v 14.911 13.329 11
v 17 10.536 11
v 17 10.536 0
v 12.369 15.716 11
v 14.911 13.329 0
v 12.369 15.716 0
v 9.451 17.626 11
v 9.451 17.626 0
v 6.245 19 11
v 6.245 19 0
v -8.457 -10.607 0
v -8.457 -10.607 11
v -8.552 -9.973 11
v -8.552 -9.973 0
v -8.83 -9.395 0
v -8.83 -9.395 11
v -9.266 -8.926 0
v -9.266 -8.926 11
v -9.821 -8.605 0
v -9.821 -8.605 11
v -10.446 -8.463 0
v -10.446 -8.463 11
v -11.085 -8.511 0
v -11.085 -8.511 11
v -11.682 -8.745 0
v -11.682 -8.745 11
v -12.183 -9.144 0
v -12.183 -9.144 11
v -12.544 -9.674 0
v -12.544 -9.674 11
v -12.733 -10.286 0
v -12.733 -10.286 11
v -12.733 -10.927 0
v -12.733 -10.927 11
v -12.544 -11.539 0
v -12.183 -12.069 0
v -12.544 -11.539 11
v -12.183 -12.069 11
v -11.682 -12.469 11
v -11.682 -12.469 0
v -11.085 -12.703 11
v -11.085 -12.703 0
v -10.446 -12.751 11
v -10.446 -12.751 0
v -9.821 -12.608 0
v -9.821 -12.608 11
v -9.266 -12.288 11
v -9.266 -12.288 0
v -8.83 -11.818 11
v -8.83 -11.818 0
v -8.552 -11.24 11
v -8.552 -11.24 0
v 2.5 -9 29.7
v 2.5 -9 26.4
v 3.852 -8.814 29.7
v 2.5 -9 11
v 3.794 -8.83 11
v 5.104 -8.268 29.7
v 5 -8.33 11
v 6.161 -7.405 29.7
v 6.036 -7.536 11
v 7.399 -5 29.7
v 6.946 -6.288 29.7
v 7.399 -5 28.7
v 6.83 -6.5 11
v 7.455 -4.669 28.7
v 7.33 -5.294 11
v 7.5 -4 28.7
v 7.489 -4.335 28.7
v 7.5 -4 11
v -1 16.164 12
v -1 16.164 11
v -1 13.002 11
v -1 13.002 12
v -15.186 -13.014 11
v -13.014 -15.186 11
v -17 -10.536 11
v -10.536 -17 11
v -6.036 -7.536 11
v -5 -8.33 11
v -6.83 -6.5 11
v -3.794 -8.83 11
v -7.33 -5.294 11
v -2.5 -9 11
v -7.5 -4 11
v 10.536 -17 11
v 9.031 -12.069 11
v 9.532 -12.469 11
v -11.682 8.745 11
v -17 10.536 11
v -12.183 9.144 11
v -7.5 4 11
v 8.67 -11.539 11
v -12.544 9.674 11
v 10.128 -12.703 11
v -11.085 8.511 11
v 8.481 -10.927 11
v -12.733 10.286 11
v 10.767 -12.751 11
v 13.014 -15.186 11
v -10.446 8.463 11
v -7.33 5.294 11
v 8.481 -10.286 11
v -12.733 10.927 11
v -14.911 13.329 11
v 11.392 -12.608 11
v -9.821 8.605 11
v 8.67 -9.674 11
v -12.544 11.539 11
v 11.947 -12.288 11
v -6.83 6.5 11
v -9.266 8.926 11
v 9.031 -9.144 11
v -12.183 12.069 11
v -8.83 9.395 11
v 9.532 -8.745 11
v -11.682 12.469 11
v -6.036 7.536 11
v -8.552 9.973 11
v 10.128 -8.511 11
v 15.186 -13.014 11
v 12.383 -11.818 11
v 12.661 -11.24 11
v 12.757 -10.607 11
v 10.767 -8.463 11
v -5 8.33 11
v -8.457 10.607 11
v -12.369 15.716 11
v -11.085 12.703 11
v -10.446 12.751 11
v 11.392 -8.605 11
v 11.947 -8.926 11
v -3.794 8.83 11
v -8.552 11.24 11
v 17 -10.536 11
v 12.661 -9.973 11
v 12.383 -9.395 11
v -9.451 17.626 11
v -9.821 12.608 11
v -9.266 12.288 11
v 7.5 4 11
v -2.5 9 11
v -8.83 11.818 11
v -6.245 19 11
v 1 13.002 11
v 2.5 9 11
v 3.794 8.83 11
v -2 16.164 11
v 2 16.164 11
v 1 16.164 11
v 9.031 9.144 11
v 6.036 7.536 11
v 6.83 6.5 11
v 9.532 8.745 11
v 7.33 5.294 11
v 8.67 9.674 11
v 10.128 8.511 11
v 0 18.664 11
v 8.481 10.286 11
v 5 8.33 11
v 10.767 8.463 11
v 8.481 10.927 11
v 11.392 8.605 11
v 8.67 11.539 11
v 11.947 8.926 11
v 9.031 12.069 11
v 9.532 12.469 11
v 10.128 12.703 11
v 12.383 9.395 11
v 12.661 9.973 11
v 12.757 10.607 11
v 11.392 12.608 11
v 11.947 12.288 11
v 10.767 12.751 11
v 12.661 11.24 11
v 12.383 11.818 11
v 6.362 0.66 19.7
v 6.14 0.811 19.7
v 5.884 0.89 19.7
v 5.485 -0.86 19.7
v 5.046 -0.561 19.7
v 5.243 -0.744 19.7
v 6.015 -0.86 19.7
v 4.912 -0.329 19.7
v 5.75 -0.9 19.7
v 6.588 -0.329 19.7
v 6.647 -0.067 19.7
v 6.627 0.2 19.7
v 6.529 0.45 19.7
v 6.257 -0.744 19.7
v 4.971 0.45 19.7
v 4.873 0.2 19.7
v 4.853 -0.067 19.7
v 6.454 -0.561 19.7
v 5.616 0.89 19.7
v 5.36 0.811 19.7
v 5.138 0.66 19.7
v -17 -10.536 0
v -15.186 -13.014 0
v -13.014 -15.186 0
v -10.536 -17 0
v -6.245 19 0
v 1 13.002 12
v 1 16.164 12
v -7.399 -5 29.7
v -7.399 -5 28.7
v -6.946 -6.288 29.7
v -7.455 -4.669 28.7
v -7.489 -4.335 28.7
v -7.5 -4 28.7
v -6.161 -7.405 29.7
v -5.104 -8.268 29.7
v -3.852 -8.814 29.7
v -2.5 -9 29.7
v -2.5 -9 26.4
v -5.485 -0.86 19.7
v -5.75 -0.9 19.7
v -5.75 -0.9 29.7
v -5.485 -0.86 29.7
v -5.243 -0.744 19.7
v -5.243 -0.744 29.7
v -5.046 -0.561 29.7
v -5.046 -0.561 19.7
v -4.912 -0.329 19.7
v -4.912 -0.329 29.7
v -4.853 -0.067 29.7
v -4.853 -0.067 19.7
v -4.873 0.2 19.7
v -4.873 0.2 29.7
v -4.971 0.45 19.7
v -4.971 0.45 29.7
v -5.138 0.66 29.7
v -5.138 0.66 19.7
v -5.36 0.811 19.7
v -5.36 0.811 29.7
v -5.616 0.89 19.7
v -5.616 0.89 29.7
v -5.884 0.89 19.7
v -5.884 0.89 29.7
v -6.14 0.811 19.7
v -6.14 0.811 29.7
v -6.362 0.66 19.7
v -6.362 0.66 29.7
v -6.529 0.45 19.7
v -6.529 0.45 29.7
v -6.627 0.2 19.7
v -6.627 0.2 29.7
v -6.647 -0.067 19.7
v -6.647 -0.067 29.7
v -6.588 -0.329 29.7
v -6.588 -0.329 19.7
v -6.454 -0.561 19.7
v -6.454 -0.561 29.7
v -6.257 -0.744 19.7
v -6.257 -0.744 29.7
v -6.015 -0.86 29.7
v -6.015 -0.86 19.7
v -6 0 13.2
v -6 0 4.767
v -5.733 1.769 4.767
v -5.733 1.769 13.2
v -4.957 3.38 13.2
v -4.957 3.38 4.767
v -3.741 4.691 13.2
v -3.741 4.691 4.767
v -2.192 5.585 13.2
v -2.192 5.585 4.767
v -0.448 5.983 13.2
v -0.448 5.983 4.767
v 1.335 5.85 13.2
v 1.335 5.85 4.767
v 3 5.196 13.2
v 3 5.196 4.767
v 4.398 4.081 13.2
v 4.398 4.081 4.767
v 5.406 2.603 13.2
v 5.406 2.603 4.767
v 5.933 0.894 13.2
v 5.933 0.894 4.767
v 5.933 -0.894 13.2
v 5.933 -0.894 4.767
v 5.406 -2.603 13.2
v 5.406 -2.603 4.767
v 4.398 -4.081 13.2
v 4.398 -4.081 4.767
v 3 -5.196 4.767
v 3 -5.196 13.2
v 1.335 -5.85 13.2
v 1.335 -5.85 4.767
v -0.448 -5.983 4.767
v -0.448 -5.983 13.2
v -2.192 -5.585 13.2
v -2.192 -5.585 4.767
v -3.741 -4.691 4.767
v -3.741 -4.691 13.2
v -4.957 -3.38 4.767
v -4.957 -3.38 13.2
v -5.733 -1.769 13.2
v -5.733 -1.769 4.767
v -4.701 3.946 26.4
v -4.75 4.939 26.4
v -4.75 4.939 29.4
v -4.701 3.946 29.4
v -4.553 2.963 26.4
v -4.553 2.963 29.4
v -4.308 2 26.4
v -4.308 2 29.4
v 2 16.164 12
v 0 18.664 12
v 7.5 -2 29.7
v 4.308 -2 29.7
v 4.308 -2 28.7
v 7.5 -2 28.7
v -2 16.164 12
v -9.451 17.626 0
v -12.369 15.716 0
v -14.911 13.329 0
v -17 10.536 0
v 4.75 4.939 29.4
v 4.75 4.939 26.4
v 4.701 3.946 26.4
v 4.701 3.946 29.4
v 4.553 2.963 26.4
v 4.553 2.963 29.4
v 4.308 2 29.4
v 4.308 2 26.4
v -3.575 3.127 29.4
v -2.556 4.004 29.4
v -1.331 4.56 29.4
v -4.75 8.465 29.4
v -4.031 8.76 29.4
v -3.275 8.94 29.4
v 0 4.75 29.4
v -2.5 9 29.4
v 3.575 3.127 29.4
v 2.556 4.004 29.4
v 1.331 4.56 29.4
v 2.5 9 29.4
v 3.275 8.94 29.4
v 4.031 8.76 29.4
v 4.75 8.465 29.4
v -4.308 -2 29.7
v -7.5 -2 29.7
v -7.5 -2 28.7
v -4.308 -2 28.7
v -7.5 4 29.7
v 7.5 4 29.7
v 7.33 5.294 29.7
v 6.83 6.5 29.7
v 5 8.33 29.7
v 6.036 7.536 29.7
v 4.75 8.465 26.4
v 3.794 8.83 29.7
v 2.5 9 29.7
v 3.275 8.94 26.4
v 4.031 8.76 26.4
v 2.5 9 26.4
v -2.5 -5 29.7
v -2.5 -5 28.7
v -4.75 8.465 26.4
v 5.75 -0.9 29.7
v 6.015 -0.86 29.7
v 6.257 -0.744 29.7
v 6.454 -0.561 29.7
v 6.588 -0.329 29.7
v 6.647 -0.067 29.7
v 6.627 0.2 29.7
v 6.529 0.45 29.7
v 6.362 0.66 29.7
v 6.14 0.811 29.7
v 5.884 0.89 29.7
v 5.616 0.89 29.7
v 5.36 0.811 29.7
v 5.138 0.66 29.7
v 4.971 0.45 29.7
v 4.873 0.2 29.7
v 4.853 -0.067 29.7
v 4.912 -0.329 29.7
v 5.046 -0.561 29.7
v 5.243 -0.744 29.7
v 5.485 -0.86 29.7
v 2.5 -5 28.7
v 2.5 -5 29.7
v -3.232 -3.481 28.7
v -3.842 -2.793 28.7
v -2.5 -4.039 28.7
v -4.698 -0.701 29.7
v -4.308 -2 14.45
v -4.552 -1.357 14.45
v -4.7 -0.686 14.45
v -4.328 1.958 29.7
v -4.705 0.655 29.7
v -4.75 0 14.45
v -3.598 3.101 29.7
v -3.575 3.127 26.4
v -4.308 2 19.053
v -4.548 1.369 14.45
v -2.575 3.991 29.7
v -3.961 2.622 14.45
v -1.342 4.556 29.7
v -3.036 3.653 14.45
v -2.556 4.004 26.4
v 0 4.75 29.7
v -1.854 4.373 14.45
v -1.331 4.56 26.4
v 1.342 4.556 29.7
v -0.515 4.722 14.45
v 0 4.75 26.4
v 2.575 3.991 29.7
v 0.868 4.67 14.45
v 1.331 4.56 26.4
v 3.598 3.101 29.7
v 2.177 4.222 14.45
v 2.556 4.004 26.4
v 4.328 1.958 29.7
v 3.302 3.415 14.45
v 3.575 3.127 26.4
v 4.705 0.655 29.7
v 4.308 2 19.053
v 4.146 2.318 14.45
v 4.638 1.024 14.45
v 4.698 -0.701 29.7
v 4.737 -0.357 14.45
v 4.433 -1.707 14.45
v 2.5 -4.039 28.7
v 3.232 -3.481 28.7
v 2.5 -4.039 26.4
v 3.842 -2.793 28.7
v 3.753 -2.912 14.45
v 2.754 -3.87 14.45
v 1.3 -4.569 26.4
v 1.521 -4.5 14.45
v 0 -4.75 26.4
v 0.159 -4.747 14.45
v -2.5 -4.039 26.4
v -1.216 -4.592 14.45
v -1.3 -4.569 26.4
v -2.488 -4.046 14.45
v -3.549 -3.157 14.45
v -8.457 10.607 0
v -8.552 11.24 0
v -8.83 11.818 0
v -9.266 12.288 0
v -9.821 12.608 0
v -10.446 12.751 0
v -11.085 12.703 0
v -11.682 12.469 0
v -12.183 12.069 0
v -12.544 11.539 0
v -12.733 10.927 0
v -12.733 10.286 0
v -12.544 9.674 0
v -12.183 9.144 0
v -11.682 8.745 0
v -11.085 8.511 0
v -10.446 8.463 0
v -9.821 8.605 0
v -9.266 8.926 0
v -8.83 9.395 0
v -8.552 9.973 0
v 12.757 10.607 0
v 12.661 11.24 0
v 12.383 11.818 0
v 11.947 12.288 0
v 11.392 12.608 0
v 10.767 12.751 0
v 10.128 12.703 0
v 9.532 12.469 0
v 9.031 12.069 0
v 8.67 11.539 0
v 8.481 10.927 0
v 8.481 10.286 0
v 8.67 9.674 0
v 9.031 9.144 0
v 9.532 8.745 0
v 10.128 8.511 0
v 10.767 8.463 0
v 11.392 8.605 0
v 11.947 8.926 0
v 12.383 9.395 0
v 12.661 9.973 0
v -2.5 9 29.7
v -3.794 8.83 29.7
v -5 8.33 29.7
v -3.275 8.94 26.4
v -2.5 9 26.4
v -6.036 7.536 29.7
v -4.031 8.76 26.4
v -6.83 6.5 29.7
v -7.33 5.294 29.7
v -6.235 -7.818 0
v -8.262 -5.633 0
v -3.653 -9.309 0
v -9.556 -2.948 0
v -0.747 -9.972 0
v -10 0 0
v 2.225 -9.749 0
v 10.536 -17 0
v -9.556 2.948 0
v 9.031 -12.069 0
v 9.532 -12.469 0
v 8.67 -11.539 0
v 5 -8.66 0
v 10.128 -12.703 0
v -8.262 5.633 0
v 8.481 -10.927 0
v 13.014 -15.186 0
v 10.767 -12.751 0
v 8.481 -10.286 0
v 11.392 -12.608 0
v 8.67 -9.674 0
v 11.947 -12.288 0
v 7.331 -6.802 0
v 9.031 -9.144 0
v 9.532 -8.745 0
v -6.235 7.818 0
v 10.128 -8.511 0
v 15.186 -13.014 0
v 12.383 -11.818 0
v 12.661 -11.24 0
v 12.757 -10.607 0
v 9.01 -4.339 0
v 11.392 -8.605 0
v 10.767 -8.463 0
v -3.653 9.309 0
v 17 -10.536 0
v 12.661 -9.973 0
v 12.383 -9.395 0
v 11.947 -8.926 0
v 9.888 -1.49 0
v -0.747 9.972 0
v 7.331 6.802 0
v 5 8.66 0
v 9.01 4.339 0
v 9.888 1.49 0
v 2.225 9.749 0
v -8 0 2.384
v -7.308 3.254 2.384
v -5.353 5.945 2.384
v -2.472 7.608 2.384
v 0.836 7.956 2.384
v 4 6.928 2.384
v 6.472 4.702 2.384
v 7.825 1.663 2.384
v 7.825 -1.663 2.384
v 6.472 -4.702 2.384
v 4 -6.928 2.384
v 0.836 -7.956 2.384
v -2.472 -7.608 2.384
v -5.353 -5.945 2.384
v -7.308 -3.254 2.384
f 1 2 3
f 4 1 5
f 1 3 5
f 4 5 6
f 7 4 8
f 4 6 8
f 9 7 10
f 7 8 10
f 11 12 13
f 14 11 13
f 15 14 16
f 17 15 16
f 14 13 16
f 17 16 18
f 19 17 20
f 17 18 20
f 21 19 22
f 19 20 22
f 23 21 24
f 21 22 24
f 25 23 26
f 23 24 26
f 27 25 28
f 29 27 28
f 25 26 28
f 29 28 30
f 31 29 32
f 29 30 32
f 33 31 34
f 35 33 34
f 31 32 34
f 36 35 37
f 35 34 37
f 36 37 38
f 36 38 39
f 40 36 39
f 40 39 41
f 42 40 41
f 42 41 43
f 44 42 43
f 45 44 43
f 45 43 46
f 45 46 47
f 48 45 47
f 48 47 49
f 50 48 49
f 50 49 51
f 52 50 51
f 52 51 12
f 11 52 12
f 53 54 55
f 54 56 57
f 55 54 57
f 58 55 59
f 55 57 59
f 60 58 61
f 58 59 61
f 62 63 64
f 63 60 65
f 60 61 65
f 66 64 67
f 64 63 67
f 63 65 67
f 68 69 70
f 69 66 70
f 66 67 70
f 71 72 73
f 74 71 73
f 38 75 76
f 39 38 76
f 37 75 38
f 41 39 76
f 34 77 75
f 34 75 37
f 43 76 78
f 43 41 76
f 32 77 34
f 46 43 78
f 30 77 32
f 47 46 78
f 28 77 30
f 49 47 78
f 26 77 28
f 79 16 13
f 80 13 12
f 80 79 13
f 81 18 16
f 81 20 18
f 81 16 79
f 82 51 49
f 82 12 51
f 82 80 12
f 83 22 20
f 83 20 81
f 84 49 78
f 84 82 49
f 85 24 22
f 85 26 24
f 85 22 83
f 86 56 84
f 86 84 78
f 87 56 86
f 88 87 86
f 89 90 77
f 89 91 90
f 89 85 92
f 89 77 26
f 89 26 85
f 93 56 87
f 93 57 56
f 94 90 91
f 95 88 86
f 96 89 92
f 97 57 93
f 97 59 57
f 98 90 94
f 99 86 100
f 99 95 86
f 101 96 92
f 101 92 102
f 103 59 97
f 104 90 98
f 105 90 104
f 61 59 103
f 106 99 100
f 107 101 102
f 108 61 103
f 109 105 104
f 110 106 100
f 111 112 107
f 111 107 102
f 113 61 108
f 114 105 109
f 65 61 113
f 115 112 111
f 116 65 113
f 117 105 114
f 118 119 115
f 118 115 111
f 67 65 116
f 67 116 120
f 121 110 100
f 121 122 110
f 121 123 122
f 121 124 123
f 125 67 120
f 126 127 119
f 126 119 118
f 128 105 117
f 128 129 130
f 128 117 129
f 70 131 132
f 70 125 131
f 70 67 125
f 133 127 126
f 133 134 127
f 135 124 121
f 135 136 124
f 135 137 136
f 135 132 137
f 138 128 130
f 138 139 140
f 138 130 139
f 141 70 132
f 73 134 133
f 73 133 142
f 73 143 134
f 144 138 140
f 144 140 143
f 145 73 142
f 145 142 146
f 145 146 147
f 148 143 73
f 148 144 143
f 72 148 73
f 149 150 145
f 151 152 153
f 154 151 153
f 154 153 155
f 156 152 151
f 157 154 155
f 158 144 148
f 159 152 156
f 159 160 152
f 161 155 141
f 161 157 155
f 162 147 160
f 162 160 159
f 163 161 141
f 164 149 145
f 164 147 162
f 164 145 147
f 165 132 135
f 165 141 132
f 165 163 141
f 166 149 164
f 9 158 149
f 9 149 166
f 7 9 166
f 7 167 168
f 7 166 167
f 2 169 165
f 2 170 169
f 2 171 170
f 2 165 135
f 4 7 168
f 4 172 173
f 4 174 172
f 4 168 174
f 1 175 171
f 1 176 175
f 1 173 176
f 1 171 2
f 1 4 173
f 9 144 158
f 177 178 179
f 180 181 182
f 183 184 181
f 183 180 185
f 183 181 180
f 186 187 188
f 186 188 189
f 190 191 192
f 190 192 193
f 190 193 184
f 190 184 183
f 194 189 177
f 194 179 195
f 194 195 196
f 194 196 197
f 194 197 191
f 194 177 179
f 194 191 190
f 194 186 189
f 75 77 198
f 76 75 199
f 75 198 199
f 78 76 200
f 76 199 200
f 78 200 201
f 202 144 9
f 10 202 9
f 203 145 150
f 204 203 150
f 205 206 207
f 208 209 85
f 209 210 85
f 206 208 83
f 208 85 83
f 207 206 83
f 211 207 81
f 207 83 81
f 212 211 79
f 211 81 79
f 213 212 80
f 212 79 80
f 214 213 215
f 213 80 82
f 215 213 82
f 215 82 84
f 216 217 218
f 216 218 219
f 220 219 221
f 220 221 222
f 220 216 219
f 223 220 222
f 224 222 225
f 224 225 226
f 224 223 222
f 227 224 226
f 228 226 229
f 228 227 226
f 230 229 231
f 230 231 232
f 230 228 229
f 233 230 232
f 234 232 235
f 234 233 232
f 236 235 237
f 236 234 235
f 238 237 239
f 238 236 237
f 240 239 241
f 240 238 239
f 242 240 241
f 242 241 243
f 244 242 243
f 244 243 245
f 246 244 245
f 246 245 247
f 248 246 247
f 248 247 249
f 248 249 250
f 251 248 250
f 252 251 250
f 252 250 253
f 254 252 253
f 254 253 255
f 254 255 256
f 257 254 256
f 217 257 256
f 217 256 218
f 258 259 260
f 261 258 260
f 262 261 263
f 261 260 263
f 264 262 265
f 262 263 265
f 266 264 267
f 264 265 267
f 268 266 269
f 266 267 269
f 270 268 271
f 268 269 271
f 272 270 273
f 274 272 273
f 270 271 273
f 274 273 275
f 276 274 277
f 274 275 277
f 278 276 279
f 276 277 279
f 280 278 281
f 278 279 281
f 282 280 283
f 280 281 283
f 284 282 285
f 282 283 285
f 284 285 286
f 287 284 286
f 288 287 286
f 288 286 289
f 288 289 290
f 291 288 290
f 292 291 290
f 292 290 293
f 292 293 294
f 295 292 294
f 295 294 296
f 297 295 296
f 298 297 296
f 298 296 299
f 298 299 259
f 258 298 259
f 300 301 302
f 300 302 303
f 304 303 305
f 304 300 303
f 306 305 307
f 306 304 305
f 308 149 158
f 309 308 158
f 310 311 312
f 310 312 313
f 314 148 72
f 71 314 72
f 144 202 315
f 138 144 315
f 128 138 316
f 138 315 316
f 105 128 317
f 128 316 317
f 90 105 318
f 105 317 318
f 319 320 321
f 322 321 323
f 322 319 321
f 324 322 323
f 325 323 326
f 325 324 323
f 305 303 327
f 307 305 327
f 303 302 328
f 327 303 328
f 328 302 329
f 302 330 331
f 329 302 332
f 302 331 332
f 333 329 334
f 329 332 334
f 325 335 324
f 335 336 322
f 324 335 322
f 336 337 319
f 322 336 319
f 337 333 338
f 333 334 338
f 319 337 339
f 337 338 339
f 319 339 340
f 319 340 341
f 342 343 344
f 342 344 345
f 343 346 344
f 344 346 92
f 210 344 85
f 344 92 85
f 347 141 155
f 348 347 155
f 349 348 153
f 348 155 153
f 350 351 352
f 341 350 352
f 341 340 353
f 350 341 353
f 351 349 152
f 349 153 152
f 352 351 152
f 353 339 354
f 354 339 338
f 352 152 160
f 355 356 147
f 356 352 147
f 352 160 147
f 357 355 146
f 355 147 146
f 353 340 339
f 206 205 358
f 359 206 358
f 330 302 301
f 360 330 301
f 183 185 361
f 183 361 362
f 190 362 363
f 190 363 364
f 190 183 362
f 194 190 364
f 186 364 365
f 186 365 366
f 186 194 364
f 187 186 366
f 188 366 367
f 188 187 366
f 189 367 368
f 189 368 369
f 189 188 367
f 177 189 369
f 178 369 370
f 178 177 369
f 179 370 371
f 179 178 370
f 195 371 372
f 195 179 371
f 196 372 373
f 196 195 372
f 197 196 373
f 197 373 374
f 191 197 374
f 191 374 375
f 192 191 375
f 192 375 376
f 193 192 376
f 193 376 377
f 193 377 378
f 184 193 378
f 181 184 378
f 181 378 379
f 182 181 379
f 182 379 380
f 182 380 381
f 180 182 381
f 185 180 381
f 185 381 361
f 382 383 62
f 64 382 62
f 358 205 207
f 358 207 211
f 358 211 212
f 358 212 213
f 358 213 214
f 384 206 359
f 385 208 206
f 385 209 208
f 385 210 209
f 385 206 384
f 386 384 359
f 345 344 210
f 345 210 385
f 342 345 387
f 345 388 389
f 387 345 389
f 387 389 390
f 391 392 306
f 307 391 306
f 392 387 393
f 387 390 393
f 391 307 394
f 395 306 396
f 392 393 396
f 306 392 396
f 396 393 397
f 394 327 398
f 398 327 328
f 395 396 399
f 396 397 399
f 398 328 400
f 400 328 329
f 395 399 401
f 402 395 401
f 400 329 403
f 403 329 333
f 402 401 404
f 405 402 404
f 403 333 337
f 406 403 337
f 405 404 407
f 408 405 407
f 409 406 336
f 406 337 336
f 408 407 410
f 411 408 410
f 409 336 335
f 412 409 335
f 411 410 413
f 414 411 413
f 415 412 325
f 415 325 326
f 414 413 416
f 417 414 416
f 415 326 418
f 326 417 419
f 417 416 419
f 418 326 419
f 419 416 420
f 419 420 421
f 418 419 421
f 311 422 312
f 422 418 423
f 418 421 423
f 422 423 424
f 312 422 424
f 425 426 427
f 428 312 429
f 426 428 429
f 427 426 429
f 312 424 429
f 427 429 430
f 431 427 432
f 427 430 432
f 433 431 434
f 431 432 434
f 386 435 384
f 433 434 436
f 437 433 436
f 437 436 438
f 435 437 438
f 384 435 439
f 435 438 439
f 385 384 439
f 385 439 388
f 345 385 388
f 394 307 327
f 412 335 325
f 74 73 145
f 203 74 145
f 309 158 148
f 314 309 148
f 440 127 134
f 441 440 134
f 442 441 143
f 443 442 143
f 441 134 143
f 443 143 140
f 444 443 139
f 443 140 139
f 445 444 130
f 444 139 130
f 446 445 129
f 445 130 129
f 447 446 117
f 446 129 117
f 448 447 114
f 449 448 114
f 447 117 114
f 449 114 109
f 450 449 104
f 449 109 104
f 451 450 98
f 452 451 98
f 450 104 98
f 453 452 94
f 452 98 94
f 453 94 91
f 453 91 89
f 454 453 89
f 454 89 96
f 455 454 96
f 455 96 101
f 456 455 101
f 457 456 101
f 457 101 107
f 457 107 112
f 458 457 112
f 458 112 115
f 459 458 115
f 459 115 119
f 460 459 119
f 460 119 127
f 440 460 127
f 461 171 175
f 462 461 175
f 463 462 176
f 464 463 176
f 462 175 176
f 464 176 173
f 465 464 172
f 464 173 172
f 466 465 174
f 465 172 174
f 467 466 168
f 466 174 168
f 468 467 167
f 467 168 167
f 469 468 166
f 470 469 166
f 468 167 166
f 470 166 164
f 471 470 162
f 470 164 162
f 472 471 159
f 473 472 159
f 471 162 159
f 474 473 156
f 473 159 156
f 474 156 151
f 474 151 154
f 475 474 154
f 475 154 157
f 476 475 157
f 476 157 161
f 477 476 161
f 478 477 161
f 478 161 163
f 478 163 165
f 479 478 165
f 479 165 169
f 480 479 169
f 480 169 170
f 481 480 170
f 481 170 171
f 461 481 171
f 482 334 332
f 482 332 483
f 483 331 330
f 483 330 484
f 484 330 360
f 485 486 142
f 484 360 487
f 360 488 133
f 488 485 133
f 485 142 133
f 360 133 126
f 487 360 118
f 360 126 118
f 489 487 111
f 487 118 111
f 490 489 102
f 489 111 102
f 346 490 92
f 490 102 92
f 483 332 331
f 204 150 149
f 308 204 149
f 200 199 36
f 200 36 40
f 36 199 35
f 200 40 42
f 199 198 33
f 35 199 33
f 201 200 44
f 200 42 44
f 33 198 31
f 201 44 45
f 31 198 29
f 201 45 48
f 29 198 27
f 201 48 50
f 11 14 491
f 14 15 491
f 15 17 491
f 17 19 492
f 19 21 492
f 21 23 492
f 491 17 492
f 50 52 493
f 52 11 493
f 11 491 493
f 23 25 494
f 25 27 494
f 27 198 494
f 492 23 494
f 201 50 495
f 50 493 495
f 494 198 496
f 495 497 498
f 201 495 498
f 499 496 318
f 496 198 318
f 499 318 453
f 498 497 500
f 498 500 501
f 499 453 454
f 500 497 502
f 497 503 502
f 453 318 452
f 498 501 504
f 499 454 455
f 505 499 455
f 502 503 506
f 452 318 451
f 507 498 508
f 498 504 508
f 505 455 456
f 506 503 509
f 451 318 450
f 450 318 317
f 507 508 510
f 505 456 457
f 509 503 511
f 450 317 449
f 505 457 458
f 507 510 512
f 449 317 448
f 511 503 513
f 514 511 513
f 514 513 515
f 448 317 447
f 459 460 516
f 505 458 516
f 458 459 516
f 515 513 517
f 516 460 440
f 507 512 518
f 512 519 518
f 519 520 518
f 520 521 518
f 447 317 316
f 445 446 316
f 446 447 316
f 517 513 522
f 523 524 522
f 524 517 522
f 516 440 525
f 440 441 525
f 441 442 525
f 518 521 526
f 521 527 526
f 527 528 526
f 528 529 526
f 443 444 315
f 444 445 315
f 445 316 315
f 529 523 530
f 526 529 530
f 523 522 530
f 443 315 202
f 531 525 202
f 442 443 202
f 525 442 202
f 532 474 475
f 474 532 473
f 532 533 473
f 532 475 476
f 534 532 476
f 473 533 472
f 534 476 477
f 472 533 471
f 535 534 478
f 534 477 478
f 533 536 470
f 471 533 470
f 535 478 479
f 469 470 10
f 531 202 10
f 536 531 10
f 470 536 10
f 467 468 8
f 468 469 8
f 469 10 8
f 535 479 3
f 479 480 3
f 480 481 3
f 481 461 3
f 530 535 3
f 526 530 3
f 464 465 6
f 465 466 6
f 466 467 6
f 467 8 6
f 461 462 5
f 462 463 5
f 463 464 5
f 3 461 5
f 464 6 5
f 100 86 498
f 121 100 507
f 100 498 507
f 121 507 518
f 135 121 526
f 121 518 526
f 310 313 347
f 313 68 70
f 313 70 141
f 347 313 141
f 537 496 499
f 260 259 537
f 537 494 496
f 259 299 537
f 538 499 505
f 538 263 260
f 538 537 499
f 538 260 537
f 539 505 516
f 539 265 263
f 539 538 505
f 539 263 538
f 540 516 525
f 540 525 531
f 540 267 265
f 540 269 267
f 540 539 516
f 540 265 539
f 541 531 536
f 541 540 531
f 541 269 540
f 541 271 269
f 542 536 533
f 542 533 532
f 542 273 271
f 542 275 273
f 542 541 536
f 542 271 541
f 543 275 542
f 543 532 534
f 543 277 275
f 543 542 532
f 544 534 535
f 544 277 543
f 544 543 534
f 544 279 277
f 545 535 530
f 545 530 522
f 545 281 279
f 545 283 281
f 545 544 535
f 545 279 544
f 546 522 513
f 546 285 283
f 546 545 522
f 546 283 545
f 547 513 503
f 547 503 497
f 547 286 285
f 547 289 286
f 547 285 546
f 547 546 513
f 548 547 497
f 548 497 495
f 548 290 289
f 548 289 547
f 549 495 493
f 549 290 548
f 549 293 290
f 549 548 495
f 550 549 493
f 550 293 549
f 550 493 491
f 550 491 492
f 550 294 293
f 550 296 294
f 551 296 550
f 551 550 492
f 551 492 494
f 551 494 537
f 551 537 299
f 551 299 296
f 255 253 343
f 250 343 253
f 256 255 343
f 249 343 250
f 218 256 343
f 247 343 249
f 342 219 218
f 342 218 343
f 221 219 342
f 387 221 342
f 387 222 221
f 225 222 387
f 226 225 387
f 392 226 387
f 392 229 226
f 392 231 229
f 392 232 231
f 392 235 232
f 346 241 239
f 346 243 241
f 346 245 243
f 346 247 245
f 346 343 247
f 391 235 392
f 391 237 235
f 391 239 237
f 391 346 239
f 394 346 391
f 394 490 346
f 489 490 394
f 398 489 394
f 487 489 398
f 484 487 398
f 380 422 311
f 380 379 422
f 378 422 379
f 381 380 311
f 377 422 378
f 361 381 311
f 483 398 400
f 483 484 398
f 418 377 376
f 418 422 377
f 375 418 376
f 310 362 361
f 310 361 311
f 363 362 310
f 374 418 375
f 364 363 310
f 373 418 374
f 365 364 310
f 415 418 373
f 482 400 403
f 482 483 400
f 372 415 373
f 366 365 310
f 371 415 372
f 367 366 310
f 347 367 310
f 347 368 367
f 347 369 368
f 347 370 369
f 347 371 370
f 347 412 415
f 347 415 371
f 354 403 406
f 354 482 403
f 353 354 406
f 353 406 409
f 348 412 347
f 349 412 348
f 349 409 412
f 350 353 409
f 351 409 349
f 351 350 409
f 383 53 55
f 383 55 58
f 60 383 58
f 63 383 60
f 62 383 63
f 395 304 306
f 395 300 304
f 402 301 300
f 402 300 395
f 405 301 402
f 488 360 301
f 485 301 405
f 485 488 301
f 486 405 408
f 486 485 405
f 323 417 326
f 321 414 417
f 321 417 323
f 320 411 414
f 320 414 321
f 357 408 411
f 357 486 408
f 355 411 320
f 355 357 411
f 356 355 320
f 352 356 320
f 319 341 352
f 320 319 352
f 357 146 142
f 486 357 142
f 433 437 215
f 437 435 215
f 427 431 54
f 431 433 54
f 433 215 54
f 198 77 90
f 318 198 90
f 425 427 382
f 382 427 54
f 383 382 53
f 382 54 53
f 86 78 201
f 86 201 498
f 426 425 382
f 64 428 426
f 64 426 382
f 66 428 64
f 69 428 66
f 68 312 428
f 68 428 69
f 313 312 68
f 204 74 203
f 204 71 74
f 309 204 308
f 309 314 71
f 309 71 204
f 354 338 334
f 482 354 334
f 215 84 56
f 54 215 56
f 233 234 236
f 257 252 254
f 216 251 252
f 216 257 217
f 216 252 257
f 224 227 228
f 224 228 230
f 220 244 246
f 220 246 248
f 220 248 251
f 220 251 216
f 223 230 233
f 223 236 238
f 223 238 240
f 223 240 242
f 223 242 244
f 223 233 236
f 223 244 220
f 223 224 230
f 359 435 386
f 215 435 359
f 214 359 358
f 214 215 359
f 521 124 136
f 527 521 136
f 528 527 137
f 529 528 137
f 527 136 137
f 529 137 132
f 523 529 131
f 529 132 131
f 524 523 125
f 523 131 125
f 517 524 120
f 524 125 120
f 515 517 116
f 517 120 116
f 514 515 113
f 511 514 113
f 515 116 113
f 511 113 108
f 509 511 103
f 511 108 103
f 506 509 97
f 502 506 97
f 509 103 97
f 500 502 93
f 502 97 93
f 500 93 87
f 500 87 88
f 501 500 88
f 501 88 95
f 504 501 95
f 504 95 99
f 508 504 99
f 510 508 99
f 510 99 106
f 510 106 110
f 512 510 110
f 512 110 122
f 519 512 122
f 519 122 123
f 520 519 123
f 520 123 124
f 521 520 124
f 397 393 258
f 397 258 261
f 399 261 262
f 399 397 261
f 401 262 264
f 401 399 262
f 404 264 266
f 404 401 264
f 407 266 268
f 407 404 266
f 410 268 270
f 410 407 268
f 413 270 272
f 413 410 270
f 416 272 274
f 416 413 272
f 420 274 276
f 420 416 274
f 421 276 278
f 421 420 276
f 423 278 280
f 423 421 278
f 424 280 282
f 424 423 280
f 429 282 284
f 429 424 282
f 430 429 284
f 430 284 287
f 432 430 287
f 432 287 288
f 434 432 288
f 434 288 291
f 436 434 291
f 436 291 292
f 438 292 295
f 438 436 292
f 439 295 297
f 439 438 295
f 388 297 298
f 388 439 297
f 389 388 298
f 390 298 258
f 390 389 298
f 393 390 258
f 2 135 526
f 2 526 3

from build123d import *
from build123d.topology import SkipClean

# Parameters (mm, degrees)
SKETCH1_R           = 20
SKETCH1_R_2         = 4.75
BOSS_EXTRUDE1_DEPTH = 11
SKETCH2_W           = 13.186598354
SKETCH2_H           = 1
SKETCH2_W_2         = 3
SKETCH2_H_2         = 26.426474467
SKETCH2_H_3         = 26.621798467
SKETCH2_W_3         = 40.686040312
SKETCH2_H_4         = 3
CUT_EXTRUDE1_DEPTH  = 31.347981811
SKETCH3_R           = 2.15
CUT_EXTRUDE2_DEPTH  = 28.766886754
SKETCH5_R           = 0.9
BOSS_EXTRUDE2_DEPTH = 18.7
SKETCH13_R          = 0.9
BOSS_EXTRUDE3_DEPTH = 8.7
SKETCH7_W           = 68.268212127
SKETCH7_H           = 3
CUT_EXTRUDE4_DEPTH  = 1
SKETCH10_R          = 4.75
CUT_EXTRUDE6_DEPTH  = 40.141921261
SKETCH11_W          = 9.5
SKETCH11_H          = 3
CUT_EXTRUDE7_DEPTH  = 7
SKETCH12_R          = 6
CUT_EXTRUDE8_DEPTH  = 14.7
CHAMFER2_SIZE       = 1.5
CHAMFER1_SIZE       = 4
CHAMFER1_SIZE2      = 4.76701437
FILLET2_R           = 10
SKETCH14_W          = 5
SKETCH14_H          = 3.3
CUT_EXTRUDE9_DEPTH  = 10
BOSS_EXTRUDE4_DEPTH = 1


with BuildPart() as part:
    # Sketch1 → Boss-Extrude1 (new body)
    with BuildSketch(Plane.XY):
        Circle(SKETCH1_R)
        Circle(SKETCH1_R_2, mode=Mode.SUBTRACT)
    extrude(amount=BOSS_EXTRUDE1_DEPTH)

    # Sketch2 → Cut-Extrude1 (cut, through all)
    with BuildSketch(Plane.XY.offset(11)):
        with Locations((0, 19.5)):
            Rectangle(SKETCH2_W, SKETCH2_H)
        with Locations((-18.5, 2.677583481)):
            Rectangle(SKETCH2_W_2, SKETCH2_H_2)
        with Locations((18.5, -1.585343055)):
            Rectangle(SKETCH2_W_2, SKETCH2_H_3)
        with Locations((1.398669187, -18.5)):
            Rectangle(SKETCH2_W_3, SKETCH2_H_4)
    extrude(amount=-CUT_EXTRUDE1_DEPTH, mode=Mode.SUBTRACT)

    # Sketch3 → Cut-Extrude2 (cut, through all)
    with BuildSketch(Plane.XY.offset(11)):
        with Locations((-10.606601718, -10.606601718)):
            Circle(SKETCH3_R)
        with Locations((-10.606601718, 10.606601718)):
            Circle(SKETCH3_R)
        with Locations((10.606601718, 10.606601718)):
            Circle(SKETCH3_R)
        with Locations((10.606601718, -10.606601718)):
            Circle(SKETCH3_R)
    extrude(amount=-CUT_EXTRUDE2_DEPTH, mode=Mode.SUBTRACT)

    # Sketch5 → Boss-Extrude2 (add)
    with BuildSketch(Plane.XY.offset(11)):
        with BuildLine():
            Line((7.5, -4), (7.5, 4))
            ThreePointArc((7.5, 4), (6.035533906, 7.535533906), (2.5, 9))
            Line((2.5, 9), (-2.5, 9))
            ThreePointArc((-2.5, 9), (-6.035533906, 7.535533906), (-7.5, 4))
            Line((-7.5, 4), (-7.5, -4))
            ThreePointArc((-7.5, -4), (-6.035533906, -7.535533906), (-2.5, -9))
            Line((-2.5, -9), (2.5, -9))
            ThreePointArc((2.5, -9), (6.035533906, -7.535533906), (7.5, -4))
        make_face()
        with Locations(Location((-5.75, 0, 0), (0, 0, 270))):
            Circle(SKETCH5_R, mode=Mode.SUBTRACT)
        with Locations(Location((5.75, 0, 0), (0, 0, 270))):
            Circle(SKETCH5_R, mode=Mode.SUBTRACT)
    extrude(amount=BOSS_EXTRUDE2_DEPTH)

    # Sketch13 → Boss-Extrude3 (add)
    with BuildSketch(Plane.XY.offset(11)):
        with Locations(Location((5.75, 0, 0), (0, 0, 270))):
            Circle(SKETCH13_R)
        with Locations(Location((-5.75, 0, 0), (0, 0, 270))):
            Circle(SKETCH13_R)
    extrude(amount=BOSS_EXTRUDE3_DEPTH)

    # Sketch7 → Cut-Extrude4 (cut)
    with BuildSketch(Plane.XY.offset(29.7)):
        with Locations((-6.527699882, -3.5)):
            Rectangle(SKETCH7_W, SKETCH7_H)
    extrude(amount=-CUT_EXTRUDE4_DEPTH, mode=Mode.SUBTRACT)

    # Sketch10 → Cut-Extrude6 (cut, through all)
    with SkipClean():  # the faces are left unmerged after this step: merging them gives an invalid solid
        with BuildSketch(Plane(origin=(0, 0, 0), x_dir=(-1, 0, 0), z_dir=(0, 0, -1))):
            with Locations(Location((0, 0, 0), (0, 0, 335.09893763))):
                Circle(SKETCH10_R)
        extrude(amount=-CUT_EXTRUDE6_DEPTH, mode=Mode.SUBTRACT)

    # Sketch11 → Cut-Extrude7 (cut)
    with SkipClean():  # the faces are left unmerged after this step: merging them gives an invalid solid
        with BuildSketch(Plane(origin=(0, 9, 0), x_dir=(1, 0, 0), z_dir=(0, 1, 0))):
            with Locations((0, -27.9)):
                Rectangle(SKETCH11_W, SKETCH11_H)
        extrude(amount=-CUT_EXTRUDE7_DEPTH, mode=Mode.SUBTRACT)

    # Sketch12 → Cut-Extrude8 (cut)
    with BuildSketch(Plane(origin=(0, 0, 0), x_dir=(-1, 0, 0), z_dir=(0, 0, -1))):
        Circle(SKETCH12_R)
    extrude(amount=-CUT_EXTRUDE8_DEPTH, mode=Mode.SUBTRACT)

    # Chamfer2
    # the kernel refuses this chamfer: 1.5 mm, written as the material it adds along each edge
    with BuildSketch(Plane(origin=(0, 0, 14.7), x_dir=(-1, 0, 0), z_dir=(0, -1, 0))) as chamfer2_piece_1_section:
        Polygon((6, CHAMFER2_SIZE), (6 - CHAMFER2_SIZE, 0), (6, 0), align=None)
    chamfer2_piece_1 = revolve(axis=Axis((0, 0, 14.7), (0, 0, -1)), mode=Mode.PRIVATE)
    chamfer2_piece_1 = chamfer2_piece_1 - Plane(origin=(0, 0, 14.7), x_dir=(-0.9070362073508065, -0.4210526315731381, 0), z_dir=(0, 0, -1)) * Cylinder(4.75, 24, mode=Mode.PRIVATE)
    add(chamfer2_piece_1)

    # Chamfer1
    chamfer1_edges = [part.edges().sort_by_distance(p)[0] for p in [
        (6, 0, 0),
    ]]
    chamfer1_side = [part.faces().sort_by_distance(p)[0] for p in [
        (16.504823264, 0, 0),
    ]]
    chamfer(chamfer1_edges, length=CHAMFER1_SIZE, length2=CHAMFER1_SIZE2, reference=chamfer1_side[0])

    # Fillet2
    # the kernel refuses this fillet: 10 mm, written as the material it adds along each edge
    with BuildSketch(Plane(origin=(4.75, 2, 29.4), x_dir=(-1, 0, 0), z_dir=(0, 0, -1)), Plane(origin=(-4.75, 2, 19.052989911), x_dir=(1, 0, 0), z_dir=(0, 0, 1))) as fillet2_piece_1:
        with BuildLine():
            CenterArc((10, 2.938804035), FILLET2_R, 180, 17.090413612)
            Line((0, 2.938804035), (-0.2, 2.938804035))
            Line((-0.2, 2.938804035), (-0.2, 0))
            Line((-0.2, 0), (0, -0.2))
            ThreePointArc((0, -0.2), (0.220789008, -0.2), (0.250409575, -0.058776081))
            Line((0.250409575, -0.058776081), (0.441578015, 0))
        make_face()
    extrude(amount=10.347010089)

    # Sketch14 → Cut-Extrude9 (cut)
    with BuildSketch(Plane.XZ.offset(9)):
        with Locations((0, 28.05)):
            Rectangle(SKETCH14_W, SKETCH14_H)
    extrude(amount=-CUT_EXTRUDE9_DEPTH, mode=Mode.SUBTRACT)

    # Sketch15 → Boss-Extrude4 (add)
    with BuildSketch(Plane.XY.offset(11)):
        Polygon((-1, 13.002035862), (1, 13.002035862), (1, 16.164200489), (2, 16.164200489), (0, 18.664200489), (-2, 16.164200489), (-1, 16.164200489), align=None)
    extrude(amount=BOSS_EXTRUDE4_DEPTH)


solid = part.part
